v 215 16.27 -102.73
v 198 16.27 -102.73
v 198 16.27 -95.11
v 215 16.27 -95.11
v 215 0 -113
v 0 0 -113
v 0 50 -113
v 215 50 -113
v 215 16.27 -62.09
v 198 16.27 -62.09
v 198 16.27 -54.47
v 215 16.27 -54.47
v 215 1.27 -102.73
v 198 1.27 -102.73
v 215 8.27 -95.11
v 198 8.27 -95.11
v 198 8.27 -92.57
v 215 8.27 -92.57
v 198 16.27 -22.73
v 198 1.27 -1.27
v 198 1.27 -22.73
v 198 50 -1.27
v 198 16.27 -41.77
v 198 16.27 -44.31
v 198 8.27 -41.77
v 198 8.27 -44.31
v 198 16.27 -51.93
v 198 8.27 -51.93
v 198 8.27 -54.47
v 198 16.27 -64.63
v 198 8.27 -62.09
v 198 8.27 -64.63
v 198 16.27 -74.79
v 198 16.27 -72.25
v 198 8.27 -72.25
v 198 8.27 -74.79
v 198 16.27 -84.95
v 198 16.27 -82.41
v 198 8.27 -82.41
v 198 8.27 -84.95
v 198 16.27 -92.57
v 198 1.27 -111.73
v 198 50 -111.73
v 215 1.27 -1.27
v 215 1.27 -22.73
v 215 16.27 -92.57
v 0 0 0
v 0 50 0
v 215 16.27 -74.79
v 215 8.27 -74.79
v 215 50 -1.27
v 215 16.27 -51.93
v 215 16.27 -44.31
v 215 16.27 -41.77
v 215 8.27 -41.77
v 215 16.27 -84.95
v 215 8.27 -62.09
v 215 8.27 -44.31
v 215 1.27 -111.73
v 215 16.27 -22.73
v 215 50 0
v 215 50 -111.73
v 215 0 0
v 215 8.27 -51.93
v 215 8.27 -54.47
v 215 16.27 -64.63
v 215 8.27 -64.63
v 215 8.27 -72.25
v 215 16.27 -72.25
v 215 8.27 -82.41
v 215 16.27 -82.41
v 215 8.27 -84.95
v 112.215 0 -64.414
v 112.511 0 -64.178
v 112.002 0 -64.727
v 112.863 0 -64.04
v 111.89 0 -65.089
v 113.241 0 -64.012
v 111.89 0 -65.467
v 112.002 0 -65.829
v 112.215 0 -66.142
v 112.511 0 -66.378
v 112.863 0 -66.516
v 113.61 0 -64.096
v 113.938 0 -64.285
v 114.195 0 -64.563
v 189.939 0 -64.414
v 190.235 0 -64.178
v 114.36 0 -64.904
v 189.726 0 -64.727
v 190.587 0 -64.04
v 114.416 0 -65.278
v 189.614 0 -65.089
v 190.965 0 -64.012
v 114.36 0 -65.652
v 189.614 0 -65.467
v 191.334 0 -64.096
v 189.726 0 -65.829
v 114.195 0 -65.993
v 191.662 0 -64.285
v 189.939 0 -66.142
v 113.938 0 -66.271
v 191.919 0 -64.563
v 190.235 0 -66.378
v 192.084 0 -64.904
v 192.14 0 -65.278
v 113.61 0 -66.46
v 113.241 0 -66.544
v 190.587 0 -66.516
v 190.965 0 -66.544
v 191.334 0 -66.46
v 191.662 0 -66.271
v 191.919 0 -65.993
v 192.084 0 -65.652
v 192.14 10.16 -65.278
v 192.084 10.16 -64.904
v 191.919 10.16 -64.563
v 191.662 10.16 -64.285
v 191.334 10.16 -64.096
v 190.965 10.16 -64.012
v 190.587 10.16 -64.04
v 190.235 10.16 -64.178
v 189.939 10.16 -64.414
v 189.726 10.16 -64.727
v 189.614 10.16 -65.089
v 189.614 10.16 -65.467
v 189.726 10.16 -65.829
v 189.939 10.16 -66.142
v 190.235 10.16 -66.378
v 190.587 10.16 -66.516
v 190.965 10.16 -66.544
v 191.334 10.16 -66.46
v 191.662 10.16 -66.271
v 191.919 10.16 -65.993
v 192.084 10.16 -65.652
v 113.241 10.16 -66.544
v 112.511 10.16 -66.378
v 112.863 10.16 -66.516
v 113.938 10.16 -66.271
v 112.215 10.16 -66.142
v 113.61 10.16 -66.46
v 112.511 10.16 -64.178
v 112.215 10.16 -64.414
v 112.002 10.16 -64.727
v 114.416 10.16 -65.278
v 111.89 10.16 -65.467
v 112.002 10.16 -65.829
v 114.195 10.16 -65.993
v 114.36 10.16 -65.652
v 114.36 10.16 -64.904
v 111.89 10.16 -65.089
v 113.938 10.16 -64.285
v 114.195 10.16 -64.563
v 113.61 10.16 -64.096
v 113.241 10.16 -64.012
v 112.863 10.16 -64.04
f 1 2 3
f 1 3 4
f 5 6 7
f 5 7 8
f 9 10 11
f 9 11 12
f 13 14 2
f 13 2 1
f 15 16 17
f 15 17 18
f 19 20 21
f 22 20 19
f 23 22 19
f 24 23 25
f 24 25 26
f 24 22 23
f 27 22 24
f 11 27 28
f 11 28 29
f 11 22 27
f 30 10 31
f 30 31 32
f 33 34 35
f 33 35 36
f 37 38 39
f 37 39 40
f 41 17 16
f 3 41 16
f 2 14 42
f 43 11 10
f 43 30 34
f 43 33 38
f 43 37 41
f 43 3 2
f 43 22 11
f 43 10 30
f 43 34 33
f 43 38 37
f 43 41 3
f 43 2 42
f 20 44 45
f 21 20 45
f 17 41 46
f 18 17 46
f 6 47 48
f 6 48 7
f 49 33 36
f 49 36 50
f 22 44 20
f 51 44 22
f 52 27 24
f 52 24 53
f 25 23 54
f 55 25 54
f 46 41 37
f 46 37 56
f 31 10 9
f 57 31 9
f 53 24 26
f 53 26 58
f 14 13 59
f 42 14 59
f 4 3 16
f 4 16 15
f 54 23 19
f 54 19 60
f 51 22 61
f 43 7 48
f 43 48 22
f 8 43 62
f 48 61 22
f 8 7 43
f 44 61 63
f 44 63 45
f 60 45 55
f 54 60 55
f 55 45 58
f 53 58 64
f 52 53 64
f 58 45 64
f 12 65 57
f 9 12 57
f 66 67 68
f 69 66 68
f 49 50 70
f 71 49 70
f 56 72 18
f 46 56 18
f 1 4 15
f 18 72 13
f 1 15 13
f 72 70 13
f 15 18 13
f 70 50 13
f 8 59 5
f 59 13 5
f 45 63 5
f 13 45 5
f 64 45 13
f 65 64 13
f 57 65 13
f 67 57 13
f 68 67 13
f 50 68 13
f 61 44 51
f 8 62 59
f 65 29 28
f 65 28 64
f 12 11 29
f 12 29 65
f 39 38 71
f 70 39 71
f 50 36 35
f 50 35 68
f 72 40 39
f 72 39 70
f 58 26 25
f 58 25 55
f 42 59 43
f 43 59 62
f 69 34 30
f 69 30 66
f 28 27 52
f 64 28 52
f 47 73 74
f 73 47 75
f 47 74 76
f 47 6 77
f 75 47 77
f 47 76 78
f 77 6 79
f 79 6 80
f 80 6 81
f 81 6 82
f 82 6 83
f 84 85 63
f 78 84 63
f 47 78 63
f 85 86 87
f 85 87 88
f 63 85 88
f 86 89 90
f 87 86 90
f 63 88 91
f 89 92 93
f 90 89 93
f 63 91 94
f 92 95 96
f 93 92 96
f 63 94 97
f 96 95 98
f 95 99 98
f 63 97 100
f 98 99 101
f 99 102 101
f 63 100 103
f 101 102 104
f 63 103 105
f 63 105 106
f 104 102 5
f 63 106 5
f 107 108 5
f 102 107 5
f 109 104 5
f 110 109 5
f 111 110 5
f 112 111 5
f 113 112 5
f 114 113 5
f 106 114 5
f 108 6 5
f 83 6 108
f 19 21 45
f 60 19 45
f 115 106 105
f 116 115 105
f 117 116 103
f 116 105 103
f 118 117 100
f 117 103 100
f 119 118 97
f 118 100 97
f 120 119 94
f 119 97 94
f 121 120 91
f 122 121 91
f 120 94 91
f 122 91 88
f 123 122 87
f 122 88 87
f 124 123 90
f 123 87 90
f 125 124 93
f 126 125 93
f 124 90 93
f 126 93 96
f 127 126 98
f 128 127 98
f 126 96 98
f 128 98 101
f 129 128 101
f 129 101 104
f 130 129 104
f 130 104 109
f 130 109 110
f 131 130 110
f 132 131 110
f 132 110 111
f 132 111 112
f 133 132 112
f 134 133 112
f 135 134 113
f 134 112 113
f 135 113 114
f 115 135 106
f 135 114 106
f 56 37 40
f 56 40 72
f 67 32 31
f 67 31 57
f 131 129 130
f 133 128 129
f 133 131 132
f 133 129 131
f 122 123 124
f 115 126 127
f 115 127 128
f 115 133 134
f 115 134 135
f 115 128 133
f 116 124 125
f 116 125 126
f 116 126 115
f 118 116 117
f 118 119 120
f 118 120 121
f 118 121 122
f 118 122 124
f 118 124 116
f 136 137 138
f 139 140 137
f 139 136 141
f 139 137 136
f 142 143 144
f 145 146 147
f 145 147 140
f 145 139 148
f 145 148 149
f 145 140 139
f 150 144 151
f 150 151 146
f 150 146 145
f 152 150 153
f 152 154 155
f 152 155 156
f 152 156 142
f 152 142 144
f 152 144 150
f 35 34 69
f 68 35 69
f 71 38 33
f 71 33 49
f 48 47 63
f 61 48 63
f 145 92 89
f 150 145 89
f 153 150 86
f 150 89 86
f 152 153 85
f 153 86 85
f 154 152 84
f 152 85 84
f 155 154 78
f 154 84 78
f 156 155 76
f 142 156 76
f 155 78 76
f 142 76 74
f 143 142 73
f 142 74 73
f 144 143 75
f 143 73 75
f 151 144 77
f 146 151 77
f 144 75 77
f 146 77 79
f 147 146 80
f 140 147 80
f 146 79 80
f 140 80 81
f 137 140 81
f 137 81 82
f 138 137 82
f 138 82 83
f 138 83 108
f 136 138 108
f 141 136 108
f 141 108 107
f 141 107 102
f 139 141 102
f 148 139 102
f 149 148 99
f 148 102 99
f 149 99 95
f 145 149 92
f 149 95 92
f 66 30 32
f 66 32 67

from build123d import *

# Parameters (mm, degrees)
SKETCH1_W           = 215
SKETCH1_H           = 113
BOSS_EXTRUDE1_DEPTH = 50
SKETCH2_W           = 110.46
SKETCH2_H           = 48.73
CUT_EXTRUDE1_DEPTH  = 17
SKETCH4_W           = 17
SKETCH4_H           = 80
BOSS_EXTRUDE2_DEPTH = 15
SKETCH6_R           = 1.27
CUT_EXTRUDE4_DEPTH  = 10.16
SKETCH7_W           = 17
SKETCH7_H           = 2.54
CUT_EXTRUDE5_DEPTH  = 8


with BuildPart() as part:
    # Sketch1 → Boss-Extrude1 (new body)
    with BuildSketch(Plane(origin=(0, 0, 0), x_dir=(1, 0, 0), z_dir=(0, 1, 0))):
        with Locations((107.5, 56.5)):
            Rectangle(SKETCH1_W, SKETCH1_H)
    extrude(amount=BOSS_EXTRUDE1_DEPTH)

    # Sketch2 → Cut-Extrude1 (cut)
    with BuildSketch(Plane(origin=(215, 0, 0), x_dir=(0, 0, -1), z_dir=(1, 0, 0))):
        with Locations((56.5, 25.635)):
            Rectangle(SKETCH2_W, SKETCH2_H)
    extrude(amount=-CUT_EXTRUDE1_DEPTH, mode=Mode.SUBTRACT)

    # Sketch4 → Boss-Extrude2 (add)
    with BuildSketch(Plane(origin=(0, 1.27, 0), x_dir=(1, 0, 0), z_dir=(0, 1, 0))):
        with Locations((206.5, 62.73)):
            Rectangle(SKETCH4_W, SKETCH4_H)
    extrude(amount=BOSS_EXTRUDE2_DEPTH)

    # Sketch6 → Cut-Extrude4 (cut)
    with BuildSketch(Plane.XZ):
        with Locations((113.146, -65.278)):
            Circle(SKETCH6_R)
        with Locations((190.87, -65.278)):
            Circle(SKETCH6_R)
    extrude(amount=-CUT_EXTRUDE4_DEPTH, mode=Mode.SUBTRACT)

    # Sketch7 → Cut-Extrude5 (cut)
    with BuildSketch(Plane(origin=(0, 16.27, 0), x_dir=(1, 0, 0), z_dir=(0, 1, 0))):
        with Locations((206.5, 93.84)):
            Rectangle(SKETCH7_W, SKETCH7_H)
        with Locations((206.5, 83.68)):
            Rectangle(SKETCH7_W, SKETCH7_H)
        with Locations((206.5, 73.52)):
            Rectangle(SKETCH7_W, SKETCH7_H)
        with Locations((206.5, 63.36)):
            Rectangle(SKETCH7_W, SKETCH7_H)
        with Locations((206.5, 53.2)):
            Rectangle(SKETCH7_W, SKETCH7_H)
        with Locations((206.5, 43.04)):
            Rectangle(SKETCH7_W, SKETCH7_H)
    extrude(amount=-CUT_EXTRUDE5_DEPTH, mode=Mode.SUBTRACT)


solid = part.part
